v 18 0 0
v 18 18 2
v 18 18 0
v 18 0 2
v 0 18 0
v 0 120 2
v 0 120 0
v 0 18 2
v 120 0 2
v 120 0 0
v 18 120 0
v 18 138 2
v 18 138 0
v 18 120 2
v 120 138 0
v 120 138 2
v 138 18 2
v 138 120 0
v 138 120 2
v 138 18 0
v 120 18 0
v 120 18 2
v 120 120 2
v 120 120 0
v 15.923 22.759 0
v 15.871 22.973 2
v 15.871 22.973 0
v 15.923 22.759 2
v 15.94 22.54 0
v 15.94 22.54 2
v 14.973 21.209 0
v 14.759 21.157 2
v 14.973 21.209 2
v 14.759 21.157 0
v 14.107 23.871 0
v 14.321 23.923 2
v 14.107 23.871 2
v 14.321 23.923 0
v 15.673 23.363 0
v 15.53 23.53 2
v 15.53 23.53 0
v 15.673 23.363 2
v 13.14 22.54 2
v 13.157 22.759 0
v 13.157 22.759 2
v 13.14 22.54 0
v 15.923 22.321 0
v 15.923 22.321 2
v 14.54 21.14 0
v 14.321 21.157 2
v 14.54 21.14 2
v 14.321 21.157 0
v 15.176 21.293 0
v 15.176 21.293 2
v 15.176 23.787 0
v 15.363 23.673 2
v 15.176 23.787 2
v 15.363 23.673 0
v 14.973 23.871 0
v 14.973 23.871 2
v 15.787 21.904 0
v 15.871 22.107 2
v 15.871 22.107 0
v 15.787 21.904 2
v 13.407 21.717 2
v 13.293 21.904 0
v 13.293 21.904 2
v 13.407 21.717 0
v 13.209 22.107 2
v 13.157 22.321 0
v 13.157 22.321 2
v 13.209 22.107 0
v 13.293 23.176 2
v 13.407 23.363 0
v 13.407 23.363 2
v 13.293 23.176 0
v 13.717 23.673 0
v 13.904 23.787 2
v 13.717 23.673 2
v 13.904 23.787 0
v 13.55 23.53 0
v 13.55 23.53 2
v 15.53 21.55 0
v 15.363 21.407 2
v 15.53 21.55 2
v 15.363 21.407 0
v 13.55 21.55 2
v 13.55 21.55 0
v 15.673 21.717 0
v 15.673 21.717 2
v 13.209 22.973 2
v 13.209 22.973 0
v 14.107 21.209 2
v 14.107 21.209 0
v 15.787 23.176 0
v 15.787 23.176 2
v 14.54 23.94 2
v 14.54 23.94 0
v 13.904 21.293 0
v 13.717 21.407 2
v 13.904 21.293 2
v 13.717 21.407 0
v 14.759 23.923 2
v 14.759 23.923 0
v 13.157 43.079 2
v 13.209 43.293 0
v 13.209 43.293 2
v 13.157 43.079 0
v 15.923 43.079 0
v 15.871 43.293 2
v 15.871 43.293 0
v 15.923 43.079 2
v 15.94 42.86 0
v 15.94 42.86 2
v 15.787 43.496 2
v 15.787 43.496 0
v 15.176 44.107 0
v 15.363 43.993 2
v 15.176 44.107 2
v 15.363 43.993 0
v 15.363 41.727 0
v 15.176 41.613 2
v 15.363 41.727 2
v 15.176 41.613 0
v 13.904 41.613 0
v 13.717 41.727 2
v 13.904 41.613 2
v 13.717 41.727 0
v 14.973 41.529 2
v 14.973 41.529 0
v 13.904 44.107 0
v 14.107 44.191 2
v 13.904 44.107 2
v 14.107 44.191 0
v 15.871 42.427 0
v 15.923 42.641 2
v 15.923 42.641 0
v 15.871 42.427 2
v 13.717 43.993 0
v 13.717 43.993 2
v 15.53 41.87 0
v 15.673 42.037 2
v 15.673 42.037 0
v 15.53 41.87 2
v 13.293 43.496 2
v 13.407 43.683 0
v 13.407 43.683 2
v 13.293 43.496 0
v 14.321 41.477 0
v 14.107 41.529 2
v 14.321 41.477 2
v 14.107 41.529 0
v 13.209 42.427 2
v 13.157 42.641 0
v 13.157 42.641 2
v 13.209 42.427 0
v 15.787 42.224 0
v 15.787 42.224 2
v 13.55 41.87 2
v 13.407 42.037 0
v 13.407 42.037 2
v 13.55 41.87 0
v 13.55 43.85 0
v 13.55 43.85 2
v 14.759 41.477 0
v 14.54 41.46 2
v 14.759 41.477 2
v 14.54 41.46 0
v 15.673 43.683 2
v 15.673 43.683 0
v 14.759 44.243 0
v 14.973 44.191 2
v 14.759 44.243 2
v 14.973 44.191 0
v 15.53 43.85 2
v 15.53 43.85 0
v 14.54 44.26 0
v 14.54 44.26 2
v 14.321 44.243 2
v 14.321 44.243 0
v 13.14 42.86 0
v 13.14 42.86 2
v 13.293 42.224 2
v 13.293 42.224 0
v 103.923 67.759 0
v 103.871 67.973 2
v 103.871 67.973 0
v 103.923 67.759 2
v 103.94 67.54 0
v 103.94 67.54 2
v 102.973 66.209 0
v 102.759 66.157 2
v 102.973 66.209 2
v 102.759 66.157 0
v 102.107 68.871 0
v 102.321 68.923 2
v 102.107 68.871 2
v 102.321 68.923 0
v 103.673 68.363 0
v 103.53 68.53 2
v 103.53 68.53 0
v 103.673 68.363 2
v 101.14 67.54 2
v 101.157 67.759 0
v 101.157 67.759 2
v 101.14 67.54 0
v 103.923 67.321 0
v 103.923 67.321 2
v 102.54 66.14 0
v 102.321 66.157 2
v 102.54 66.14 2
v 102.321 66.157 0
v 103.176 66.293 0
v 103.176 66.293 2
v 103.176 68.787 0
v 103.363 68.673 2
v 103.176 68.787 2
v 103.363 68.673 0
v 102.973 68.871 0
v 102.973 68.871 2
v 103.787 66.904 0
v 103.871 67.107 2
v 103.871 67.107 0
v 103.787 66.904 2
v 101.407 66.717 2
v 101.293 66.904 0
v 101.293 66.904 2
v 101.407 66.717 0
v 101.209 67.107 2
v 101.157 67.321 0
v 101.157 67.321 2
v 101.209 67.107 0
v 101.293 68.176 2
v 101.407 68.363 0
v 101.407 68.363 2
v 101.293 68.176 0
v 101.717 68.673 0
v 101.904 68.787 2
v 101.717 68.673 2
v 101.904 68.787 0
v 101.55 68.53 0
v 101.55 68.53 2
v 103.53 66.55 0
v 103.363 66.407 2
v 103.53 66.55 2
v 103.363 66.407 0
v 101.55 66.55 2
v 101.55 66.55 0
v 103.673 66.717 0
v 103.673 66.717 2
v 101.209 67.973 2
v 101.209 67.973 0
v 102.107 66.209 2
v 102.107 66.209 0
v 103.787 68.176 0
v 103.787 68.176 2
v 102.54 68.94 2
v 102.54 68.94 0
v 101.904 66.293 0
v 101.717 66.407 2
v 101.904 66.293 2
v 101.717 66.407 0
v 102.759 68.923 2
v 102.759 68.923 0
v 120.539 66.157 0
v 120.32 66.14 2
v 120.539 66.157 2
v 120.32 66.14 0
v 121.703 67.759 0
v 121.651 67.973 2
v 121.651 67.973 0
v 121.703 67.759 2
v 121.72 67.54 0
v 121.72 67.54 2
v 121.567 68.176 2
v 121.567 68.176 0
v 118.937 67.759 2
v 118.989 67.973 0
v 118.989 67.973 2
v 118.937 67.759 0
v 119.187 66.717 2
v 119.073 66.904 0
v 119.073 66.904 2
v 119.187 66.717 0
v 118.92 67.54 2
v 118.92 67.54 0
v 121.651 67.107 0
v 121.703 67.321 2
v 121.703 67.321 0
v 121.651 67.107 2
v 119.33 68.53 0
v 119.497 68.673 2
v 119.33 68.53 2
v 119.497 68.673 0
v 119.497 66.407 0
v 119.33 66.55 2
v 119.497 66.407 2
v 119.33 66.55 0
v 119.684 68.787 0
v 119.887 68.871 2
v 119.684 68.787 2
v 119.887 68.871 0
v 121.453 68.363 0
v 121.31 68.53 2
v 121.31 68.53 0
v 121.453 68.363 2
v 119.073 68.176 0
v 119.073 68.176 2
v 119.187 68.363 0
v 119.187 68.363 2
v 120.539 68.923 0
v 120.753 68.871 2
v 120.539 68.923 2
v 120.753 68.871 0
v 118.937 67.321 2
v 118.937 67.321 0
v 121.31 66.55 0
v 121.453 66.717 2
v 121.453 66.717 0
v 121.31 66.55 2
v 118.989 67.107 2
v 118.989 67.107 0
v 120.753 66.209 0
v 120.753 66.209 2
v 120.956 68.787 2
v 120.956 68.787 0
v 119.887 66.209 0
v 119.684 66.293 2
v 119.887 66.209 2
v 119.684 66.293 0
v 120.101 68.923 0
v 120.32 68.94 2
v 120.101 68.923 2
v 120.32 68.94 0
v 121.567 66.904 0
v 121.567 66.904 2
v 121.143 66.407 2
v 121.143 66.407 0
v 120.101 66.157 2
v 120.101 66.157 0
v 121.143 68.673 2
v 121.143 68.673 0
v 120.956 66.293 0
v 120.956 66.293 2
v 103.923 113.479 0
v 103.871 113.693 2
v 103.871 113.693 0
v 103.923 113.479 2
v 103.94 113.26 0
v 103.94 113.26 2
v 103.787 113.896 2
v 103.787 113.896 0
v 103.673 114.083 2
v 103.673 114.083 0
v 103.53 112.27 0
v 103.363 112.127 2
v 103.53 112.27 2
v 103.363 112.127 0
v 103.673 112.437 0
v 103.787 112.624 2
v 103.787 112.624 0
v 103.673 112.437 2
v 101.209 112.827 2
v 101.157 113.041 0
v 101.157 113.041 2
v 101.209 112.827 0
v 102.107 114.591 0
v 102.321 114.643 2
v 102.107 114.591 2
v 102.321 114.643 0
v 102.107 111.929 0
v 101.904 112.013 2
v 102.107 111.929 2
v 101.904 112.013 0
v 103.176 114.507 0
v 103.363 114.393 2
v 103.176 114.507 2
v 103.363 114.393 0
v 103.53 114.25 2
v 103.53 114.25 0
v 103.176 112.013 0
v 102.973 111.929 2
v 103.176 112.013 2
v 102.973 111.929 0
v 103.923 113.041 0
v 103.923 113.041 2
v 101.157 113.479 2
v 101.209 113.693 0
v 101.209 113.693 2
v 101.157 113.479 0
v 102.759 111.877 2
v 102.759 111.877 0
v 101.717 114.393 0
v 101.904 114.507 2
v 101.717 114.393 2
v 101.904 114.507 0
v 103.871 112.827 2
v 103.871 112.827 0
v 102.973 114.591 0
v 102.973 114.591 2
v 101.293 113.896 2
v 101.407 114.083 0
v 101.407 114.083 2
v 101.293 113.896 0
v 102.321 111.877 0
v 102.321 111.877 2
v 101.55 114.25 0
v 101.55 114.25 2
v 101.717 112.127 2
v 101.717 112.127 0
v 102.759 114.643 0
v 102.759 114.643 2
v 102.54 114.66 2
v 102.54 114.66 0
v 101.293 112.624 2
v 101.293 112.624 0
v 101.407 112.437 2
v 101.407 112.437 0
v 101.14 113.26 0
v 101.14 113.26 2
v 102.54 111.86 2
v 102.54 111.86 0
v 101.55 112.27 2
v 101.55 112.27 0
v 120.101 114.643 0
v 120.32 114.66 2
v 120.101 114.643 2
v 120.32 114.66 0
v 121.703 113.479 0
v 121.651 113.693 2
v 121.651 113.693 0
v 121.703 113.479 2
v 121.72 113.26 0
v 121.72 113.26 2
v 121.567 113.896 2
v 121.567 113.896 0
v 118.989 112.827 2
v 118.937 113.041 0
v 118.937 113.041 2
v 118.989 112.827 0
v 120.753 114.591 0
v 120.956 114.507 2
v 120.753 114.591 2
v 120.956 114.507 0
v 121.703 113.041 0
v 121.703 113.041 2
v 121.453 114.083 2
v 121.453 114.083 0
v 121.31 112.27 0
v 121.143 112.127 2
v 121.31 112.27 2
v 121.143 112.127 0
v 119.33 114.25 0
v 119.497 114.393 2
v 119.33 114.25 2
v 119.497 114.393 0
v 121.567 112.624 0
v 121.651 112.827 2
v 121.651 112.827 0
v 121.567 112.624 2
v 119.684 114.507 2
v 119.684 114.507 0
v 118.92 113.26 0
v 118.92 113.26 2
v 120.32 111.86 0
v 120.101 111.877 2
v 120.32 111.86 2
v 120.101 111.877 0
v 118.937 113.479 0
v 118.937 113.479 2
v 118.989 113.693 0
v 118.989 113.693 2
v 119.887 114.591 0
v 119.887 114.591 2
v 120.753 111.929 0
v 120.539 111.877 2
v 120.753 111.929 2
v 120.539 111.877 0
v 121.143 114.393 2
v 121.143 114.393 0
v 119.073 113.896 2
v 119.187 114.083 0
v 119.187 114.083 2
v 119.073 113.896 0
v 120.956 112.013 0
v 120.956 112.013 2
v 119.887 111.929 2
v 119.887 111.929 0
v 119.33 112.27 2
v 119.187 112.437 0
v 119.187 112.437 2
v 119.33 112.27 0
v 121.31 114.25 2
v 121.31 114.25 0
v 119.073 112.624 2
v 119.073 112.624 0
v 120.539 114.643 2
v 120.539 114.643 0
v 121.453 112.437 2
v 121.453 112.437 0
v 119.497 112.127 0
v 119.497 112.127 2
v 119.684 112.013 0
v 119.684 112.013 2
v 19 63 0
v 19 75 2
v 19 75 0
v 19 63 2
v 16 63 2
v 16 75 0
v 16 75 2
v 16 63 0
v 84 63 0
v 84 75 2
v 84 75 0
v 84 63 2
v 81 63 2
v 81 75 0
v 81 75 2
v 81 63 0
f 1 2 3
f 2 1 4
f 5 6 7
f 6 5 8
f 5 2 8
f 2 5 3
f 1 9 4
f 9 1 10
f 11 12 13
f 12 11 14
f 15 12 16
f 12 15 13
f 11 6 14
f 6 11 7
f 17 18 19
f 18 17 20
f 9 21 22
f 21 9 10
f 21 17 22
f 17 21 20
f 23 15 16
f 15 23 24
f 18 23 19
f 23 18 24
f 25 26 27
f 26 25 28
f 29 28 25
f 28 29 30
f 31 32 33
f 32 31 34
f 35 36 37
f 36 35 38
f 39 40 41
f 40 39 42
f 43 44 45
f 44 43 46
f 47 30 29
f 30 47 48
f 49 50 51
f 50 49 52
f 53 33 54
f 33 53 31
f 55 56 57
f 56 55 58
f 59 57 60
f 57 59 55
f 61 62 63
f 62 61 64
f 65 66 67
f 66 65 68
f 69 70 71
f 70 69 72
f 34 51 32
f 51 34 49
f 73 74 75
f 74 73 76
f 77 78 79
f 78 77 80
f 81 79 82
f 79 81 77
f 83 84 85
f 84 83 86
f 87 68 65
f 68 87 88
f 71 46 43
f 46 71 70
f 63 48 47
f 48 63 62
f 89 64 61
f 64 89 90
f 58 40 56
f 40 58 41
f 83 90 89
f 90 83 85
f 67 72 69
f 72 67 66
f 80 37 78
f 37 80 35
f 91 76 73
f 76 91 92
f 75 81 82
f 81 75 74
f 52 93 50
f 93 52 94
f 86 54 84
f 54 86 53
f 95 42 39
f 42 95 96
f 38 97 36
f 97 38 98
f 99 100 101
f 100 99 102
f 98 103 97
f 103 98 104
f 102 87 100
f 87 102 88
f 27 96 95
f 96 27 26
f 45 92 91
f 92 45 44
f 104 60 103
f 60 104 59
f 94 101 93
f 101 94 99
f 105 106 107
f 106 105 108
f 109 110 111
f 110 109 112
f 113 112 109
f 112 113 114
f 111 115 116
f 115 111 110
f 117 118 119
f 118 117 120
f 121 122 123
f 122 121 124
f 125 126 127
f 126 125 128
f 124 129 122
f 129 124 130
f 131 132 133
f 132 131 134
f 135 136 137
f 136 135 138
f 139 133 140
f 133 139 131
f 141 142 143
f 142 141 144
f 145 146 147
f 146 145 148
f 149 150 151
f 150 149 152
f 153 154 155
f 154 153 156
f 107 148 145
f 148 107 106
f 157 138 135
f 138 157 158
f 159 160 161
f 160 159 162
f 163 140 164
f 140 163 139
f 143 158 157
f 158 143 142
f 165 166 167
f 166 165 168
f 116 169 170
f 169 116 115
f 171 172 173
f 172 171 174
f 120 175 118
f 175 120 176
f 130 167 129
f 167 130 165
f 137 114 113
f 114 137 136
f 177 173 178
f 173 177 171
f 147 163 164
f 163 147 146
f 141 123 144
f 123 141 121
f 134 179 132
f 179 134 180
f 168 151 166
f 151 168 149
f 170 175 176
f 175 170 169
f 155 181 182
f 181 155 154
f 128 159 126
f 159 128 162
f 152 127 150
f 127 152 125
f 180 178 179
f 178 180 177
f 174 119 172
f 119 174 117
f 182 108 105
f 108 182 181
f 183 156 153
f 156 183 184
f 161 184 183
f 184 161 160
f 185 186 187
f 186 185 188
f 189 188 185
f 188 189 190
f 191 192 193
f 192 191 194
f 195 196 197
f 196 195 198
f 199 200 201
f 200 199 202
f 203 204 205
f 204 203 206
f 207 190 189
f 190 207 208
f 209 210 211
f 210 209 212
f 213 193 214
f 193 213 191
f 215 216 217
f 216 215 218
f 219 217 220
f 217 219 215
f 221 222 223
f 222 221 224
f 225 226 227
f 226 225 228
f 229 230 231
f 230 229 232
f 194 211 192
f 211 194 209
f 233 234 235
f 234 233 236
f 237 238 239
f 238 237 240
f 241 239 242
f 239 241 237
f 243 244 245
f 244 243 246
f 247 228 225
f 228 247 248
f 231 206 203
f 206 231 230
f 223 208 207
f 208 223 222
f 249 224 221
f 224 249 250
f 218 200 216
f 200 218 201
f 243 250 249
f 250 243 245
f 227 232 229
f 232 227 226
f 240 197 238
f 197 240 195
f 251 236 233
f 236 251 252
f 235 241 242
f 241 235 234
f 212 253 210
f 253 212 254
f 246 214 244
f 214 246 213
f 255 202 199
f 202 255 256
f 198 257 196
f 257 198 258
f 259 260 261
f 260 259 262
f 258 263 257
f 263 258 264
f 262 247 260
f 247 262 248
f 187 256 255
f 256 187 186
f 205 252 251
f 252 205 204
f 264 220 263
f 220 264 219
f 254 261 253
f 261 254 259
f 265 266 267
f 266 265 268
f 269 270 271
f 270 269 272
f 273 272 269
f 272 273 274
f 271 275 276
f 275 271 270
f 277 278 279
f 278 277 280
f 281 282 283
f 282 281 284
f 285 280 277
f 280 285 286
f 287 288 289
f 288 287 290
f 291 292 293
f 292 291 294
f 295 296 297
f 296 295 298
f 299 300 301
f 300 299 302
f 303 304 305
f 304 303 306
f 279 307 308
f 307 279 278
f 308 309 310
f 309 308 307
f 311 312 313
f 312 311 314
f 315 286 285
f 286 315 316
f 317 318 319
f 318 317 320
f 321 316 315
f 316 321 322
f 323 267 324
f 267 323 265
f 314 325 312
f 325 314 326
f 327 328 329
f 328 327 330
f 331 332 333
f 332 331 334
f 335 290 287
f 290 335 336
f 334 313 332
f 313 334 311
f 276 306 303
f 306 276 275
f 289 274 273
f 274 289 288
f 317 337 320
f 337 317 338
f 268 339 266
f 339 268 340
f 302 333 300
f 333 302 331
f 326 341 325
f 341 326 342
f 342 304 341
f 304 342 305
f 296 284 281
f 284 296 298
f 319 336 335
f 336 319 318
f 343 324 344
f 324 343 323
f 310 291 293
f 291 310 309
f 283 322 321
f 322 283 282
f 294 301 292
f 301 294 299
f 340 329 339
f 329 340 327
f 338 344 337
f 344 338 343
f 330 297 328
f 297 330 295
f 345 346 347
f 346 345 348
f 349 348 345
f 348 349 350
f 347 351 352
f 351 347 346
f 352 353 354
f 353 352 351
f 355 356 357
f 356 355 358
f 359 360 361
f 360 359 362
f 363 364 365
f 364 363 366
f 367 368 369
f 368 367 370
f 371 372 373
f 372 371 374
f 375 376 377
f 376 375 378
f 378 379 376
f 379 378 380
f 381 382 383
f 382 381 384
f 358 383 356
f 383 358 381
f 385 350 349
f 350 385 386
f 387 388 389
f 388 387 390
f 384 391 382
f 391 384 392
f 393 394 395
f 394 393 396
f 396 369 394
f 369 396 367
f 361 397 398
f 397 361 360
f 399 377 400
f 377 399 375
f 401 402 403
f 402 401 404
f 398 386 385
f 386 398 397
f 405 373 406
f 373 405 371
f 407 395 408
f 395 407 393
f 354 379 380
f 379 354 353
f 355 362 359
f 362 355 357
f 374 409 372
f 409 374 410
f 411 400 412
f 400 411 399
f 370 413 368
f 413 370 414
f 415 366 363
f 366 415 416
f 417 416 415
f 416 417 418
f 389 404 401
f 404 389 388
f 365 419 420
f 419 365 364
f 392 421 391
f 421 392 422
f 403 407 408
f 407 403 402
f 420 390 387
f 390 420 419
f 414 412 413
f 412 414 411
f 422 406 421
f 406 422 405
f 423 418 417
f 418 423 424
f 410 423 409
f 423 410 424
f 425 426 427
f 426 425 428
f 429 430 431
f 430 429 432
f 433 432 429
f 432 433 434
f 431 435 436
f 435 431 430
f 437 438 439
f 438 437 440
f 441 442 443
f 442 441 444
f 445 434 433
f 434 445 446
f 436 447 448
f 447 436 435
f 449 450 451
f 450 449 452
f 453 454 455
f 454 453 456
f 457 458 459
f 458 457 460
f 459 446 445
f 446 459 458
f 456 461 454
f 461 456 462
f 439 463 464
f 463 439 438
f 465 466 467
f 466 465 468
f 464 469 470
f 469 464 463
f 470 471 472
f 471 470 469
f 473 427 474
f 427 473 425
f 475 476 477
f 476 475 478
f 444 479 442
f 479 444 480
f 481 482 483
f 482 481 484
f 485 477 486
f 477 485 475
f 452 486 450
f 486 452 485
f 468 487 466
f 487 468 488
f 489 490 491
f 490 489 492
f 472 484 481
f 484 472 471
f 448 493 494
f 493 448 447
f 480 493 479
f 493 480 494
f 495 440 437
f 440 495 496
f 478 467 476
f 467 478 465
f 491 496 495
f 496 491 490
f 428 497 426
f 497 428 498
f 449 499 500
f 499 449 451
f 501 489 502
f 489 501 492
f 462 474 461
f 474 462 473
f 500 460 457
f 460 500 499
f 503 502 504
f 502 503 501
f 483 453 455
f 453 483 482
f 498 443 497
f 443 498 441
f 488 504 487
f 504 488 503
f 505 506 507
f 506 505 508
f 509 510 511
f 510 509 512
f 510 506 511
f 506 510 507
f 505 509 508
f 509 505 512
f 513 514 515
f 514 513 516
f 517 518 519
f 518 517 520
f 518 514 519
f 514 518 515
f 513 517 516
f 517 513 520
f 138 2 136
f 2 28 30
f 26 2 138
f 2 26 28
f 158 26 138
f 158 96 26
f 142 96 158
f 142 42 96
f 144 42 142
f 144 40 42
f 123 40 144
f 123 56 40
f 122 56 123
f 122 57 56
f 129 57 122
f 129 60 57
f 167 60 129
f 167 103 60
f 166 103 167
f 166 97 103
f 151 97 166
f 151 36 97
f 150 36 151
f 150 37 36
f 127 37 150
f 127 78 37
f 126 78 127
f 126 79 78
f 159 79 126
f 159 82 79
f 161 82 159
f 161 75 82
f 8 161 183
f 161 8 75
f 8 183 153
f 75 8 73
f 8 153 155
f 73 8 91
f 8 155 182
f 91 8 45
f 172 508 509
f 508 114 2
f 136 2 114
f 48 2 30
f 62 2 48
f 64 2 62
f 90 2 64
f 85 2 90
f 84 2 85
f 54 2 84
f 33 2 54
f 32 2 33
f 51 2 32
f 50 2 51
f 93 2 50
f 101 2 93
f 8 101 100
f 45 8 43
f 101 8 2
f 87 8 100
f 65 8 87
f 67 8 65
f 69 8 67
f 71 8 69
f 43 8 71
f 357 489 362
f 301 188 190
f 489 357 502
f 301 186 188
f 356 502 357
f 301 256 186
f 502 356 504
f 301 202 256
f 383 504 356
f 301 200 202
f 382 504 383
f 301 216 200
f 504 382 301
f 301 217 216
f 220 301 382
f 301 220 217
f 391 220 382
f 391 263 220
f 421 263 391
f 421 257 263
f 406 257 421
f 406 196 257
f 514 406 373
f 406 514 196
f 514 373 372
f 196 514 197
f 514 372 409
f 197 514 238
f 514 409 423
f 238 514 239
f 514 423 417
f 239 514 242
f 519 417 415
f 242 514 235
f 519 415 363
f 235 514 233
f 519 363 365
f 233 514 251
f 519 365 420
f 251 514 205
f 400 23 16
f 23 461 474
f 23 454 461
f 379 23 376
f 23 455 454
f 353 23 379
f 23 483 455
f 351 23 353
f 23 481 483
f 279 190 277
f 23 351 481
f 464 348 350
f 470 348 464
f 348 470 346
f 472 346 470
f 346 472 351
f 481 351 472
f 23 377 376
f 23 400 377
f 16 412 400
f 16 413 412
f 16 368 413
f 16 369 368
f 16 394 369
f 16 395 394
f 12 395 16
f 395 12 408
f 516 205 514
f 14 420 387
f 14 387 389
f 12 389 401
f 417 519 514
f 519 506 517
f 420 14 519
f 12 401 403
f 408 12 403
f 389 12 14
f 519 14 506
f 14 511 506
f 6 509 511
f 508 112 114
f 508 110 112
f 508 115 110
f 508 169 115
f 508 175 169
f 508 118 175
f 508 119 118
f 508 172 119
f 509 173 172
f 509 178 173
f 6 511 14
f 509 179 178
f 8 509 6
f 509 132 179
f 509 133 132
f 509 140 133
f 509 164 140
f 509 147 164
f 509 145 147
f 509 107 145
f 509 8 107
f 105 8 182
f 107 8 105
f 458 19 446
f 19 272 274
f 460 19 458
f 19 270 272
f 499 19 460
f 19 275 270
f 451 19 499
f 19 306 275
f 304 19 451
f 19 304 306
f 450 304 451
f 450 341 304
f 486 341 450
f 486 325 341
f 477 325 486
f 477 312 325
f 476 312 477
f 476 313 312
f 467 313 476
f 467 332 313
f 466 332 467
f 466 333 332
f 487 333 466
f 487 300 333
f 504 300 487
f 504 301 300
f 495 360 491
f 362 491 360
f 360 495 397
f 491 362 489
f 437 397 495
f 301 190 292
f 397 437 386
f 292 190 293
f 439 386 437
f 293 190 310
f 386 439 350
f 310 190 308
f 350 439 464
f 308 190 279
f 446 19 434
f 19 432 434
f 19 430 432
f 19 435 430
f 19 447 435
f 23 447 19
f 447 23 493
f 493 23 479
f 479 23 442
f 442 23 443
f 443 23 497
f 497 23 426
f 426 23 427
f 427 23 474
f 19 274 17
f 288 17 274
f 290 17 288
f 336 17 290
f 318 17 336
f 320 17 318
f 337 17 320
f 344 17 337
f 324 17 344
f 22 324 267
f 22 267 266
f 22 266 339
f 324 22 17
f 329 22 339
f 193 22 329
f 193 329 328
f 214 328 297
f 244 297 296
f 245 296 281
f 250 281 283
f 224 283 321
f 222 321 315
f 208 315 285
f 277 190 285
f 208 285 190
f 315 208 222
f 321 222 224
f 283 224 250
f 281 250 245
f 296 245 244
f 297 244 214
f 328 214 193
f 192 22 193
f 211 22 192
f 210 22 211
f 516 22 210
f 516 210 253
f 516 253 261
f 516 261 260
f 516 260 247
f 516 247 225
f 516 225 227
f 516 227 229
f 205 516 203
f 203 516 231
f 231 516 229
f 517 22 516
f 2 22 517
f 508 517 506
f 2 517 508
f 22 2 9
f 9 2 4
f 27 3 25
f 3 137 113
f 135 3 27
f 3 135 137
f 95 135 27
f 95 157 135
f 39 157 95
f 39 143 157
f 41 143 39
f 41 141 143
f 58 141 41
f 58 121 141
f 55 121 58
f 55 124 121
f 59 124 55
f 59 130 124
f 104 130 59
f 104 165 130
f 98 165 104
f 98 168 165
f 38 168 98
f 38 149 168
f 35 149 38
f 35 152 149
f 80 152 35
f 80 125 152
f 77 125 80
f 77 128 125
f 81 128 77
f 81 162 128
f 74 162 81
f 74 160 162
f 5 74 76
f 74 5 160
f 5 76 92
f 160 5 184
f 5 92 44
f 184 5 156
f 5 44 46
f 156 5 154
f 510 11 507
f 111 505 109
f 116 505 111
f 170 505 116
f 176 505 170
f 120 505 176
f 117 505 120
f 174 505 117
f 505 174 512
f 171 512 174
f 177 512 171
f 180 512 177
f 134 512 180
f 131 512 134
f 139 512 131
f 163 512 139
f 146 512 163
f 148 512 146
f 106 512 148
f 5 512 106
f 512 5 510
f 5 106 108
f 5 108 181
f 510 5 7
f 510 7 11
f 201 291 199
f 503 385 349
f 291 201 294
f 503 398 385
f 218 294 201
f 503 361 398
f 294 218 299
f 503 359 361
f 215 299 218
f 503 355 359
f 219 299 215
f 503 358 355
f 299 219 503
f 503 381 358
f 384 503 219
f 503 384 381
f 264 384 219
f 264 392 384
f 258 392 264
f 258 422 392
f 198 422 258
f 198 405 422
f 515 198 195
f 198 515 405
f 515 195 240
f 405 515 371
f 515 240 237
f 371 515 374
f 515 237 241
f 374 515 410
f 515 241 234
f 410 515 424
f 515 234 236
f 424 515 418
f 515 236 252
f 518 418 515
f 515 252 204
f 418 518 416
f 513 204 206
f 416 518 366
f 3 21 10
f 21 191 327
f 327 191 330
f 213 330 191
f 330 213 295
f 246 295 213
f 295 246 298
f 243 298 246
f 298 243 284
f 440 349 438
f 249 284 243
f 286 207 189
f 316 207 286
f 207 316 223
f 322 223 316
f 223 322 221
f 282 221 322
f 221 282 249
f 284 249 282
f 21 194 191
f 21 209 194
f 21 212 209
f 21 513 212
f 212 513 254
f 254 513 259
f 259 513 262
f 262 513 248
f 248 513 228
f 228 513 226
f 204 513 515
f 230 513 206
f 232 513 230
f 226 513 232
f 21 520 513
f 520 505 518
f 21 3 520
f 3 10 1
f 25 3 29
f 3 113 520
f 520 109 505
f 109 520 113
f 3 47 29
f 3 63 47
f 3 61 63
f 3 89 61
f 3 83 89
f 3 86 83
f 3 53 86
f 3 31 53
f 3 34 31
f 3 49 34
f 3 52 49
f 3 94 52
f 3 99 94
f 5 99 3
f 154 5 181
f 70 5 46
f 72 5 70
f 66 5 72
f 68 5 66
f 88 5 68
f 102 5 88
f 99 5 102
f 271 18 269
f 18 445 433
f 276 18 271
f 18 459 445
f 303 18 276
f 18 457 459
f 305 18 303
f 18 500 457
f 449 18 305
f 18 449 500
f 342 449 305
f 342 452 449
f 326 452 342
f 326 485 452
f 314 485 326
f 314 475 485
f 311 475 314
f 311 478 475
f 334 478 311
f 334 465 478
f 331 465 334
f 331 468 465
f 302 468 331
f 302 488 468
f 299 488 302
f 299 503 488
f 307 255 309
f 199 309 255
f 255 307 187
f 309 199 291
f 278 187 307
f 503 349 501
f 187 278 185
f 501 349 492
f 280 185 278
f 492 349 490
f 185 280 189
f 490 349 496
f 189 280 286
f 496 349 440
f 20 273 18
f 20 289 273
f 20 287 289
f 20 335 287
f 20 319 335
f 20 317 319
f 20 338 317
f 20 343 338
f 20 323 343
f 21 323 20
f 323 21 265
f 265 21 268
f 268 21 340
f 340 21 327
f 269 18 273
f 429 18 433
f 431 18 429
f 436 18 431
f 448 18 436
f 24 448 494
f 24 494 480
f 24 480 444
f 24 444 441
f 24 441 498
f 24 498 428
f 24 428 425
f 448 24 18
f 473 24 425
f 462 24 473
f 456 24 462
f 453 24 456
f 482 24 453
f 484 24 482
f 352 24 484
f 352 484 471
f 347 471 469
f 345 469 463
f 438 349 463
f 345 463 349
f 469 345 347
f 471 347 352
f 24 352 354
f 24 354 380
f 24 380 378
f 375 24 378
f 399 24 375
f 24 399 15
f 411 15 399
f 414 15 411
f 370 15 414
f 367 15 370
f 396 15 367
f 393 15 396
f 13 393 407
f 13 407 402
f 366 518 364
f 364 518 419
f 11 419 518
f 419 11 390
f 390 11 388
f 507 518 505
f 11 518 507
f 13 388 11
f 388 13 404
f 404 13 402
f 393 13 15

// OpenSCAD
// V1 carrier for Hammond 1554R2GY; units mm. Layout source: layout.json.
// Suggested PETG/ASA; dimensions are a dry-fit design, not a production release.
// Mount on 8mm blocks + two 1.1mm adhesive layers = 10.2mm floor lift.
// Board underside: carrier top + 6mm.
// Print flat. Drill final M2.5 clearances if printer undersizes holes.
$fn=40;
w=138; h=138; t=2; notch=18;
holes=[[14.54,22.54],[14.54,42.86],[102.54,67.54],[120.32,67.54],[102.54,113.26],[120.32,113.26]];
difference(){
  cube([w,h,t]);
  for(x=[0,w-notch])for(y=[0,h-notch])translate([x,y,-1])cube([notch,notch,t+2]);
  for(p=holes)translate([p[0],p[1],-1])cylinder(d=2.8,h=t+2);
  for(x=[16,81])translate([x,63,-1])cube([3,12,t+2]);
}
